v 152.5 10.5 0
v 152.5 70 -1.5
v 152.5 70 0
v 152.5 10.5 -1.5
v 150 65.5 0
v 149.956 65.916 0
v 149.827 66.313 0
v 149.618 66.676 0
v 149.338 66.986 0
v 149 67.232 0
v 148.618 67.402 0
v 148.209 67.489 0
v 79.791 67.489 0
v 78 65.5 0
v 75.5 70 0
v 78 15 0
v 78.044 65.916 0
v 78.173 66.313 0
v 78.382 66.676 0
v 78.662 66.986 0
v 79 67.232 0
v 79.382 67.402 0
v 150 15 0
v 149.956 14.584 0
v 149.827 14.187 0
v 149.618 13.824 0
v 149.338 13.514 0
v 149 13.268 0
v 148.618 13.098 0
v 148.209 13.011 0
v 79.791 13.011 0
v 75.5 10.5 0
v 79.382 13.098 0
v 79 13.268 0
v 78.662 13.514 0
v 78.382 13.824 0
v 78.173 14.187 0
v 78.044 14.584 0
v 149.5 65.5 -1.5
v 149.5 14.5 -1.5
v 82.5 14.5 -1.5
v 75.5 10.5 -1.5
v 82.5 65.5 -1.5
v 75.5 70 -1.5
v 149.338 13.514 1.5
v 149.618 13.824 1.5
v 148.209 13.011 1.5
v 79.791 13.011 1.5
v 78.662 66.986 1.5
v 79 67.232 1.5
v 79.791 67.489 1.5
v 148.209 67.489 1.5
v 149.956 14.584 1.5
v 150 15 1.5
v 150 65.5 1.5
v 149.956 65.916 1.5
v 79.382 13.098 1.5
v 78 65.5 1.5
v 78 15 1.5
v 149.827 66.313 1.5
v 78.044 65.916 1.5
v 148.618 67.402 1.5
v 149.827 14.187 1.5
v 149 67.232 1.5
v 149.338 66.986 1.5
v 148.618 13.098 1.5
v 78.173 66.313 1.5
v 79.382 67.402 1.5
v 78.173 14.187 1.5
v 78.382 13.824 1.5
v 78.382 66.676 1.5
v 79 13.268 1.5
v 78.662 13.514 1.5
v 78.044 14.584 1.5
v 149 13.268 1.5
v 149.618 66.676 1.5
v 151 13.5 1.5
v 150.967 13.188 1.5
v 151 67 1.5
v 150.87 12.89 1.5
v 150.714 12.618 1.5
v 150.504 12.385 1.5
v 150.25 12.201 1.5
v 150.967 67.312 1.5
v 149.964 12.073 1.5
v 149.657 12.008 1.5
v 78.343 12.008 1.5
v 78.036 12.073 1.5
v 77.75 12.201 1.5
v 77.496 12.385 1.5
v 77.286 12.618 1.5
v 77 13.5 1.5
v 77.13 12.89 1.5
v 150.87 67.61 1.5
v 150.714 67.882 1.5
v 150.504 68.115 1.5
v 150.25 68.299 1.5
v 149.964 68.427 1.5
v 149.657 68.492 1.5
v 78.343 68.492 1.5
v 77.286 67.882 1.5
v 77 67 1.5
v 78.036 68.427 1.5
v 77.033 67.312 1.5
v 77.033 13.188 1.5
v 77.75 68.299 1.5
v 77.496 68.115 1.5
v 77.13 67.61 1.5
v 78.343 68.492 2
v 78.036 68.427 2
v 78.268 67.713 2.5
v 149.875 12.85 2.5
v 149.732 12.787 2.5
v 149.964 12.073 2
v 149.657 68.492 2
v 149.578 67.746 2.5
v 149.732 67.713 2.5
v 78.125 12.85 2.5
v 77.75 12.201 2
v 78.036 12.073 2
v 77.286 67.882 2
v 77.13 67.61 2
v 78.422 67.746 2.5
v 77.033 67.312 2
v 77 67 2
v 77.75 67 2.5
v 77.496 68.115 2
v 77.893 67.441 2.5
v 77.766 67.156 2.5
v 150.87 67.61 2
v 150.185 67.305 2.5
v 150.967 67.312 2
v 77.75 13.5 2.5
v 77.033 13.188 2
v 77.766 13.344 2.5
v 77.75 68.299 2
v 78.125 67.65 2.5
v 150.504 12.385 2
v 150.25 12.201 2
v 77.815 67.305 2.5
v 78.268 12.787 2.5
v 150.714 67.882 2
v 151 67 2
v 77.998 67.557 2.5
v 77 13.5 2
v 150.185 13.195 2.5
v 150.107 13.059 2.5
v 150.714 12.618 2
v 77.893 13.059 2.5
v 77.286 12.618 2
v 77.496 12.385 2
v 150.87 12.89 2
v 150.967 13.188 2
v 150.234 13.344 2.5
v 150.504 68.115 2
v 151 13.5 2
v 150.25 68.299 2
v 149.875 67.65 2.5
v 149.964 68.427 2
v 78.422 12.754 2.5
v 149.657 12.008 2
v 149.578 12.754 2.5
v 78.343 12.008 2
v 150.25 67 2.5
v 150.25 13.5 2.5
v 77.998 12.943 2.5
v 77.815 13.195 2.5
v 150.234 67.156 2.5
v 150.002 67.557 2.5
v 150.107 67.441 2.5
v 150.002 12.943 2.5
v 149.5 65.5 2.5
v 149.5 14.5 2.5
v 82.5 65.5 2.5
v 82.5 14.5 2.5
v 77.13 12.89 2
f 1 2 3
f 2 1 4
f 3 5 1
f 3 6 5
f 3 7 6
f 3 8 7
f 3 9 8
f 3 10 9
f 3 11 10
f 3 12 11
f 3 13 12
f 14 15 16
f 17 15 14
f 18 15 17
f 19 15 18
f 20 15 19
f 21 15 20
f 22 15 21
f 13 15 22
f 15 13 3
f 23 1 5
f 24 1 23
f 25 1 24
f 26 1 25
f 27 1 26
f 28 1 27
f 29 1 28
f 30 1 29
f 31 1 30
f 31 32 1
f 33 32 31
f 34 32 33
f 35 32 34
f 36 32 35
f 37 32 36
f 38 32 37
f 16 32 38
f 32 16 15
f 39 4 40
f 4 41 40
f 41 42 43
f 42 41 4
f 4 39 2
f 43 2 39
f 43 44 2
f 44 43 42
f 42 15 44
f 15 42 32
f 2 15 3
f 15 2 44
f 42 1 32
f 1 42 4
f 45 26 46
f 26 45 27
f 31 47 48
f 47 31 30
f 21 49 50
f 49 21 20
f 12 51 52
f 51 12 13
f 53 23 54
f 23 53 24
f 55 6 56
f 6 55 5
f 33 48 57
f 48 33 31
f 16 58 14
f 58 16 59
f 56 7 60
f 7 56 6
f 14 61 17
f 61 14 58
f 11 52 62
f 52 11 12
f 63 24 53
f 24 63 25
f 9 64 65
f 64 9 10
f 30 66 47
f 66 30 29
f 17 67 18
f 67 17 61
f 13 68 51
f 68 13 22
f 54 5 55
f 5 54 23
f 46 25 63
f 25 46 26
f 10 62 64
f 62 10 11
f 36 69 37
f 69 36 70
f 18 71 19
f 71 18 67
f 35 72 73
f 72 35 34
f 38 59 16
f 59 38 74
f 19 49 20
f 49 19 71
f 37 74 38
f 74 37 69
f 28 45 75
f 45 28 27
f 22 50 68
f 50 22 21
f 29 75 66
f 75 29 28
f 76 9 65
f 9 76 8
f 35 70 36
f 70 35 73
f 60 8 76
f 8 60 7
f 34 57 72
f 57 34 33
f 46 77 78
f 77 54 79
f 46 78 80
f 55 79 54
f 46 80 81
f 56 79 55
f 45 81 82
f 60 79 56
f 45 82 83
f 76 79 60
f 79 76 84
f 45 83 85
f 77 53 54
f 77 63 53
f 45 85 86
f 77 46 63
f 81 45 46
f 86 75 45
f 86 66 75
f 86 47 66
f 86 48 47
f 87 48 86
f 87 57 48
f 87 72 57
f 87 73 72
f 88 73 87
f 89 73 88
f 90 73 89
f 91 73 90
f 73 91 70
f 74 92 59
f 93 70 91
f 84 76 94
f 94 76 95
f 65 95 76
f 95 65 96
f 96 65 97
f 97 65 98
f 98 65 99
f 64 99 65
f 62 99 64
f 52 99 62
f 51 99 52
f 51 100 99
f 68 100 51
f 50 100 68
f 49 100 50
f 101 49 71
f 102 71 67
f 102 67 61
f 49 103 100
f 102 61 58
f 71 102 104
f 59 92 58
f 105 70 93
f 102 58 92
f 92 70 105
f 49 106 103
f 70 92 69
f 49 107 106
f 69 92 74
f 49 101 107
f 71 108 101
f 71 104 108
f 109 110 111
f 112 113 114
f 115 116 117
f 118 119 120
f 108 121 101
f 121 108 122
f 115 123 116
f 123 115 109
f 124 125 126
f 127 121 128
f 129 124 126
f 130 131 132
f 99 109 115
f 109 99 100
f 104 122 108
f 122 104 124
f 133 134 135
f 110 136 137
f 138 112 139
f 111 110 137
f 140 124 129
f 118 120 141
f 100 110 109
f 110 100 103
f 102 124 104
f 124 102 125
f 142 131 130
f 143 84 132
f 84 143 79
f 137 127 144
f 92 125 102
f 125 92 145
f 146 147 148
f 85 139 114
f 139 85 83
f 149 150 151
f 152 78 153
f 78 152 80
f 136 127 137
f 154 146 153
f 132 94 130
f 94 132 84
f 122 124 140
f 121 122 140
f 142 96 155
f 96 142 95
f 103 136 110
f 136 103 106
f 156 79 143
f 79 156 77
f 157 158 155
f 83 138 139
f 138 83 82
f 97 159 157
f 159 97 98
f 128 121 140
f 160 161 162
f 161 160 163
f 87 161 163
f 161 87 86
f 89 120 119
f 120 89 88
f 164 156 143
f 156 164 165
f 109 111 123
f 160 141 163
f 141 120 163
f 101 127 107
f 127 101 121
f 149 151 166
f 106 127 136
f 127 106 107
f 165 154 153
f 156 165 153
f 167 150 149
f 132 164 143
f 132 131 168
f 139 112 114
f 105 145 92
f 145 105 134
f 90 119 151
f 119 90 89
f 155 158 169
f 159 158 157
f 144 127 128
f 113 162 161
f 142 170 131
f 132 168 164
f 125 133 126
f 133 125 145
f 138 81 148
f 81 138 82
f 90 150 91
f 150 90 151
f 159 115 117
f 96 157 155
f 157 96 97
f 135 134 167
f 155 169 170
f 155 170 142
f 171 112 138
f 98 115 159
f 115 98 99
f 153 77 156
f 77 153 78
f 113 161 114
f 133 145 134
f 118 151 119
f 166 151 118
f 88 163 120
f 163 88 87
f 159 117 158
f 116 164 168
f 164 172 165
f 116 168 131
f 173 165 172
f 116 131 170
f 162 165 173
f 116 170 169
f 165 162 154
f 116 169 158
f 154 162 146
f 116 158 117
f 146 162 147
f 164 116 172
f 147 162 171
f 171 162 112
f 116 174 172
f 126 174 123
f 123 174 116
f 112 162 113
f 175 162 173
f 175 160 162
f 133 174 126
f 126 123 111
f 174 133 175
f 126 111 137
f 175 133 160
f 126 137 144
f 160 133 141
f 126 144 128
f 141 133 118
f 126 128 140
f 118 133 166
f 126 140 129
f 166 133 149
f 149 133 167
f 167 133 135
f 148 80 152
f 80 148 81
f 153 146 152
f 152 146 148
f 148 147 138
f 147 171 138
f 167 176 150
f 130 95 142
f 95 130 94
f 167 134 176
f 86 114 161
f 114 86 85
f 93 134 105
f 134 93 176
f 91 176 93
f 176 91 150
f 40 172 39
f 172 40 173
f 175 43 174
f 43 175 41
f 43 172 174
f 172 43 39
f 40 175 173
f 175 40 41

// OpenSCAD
bottom_inset = 2;
bottom_thickness = 1.5;

inner_inset = -0.5;

top_inset = 0.5;
top_thickness = 1;
top_outer_radius = 1.5;
top_inner_radius = 0.75;

/* [Hidden] */
$fs = 0.01;


// Front-Plate
/*
color("DarkBlue",1) {
  //import("Small LCD.dxf");
  linear_extrude(height = 1.5)
  import("Large LCD.dxf");
}
*/

// Bezel
difference(){
  union() {
    translate([77.5-bottom_inset,12.5-bottom_inset,-bottom_thickness]) {
      cube([5+67+1+bottom_inset+bottom_inset,2 + 51 + 2.5+bottom_inset+bottom_inset,bottom_thickness]);
    }

    inner_radius = 2;
    translate([77.5-inner_inset+inner_radius,12.5-inner_inset+inner_radius,0]) {
      minkowski()
      {
        cylinder(h=1.5/2, r=inner_radius);
        cube([5+67+1+inner_inset+inner_inset-inner_radius-inner_radius,2 + 51 + 2.5+inner_inset+inner_inset-inner_radius-inner_radius,1.5/2]);
      }
    }

  
    translate([77.5-top_inset+top_outer_radius,12.5-top_inset+top_outer_radius,1.5]) {
      minkowski()
      {
        cylinder(h=top_thickness/2, r1=top_outer_radius, r2=top_inner_radius);
        cube([5+67+1+top_inset+top_inset-top_outer_radius-top_outer_radius,2 + 51 + 2.5+top_inset+top_inset-top_outer_radius-top_outer_radius,top_thickness/2]);
          
      }
    }
    
  }
  translate([77.5+5,12.5+2,-2]) {
    cube([67,51,20]);
  }
}
